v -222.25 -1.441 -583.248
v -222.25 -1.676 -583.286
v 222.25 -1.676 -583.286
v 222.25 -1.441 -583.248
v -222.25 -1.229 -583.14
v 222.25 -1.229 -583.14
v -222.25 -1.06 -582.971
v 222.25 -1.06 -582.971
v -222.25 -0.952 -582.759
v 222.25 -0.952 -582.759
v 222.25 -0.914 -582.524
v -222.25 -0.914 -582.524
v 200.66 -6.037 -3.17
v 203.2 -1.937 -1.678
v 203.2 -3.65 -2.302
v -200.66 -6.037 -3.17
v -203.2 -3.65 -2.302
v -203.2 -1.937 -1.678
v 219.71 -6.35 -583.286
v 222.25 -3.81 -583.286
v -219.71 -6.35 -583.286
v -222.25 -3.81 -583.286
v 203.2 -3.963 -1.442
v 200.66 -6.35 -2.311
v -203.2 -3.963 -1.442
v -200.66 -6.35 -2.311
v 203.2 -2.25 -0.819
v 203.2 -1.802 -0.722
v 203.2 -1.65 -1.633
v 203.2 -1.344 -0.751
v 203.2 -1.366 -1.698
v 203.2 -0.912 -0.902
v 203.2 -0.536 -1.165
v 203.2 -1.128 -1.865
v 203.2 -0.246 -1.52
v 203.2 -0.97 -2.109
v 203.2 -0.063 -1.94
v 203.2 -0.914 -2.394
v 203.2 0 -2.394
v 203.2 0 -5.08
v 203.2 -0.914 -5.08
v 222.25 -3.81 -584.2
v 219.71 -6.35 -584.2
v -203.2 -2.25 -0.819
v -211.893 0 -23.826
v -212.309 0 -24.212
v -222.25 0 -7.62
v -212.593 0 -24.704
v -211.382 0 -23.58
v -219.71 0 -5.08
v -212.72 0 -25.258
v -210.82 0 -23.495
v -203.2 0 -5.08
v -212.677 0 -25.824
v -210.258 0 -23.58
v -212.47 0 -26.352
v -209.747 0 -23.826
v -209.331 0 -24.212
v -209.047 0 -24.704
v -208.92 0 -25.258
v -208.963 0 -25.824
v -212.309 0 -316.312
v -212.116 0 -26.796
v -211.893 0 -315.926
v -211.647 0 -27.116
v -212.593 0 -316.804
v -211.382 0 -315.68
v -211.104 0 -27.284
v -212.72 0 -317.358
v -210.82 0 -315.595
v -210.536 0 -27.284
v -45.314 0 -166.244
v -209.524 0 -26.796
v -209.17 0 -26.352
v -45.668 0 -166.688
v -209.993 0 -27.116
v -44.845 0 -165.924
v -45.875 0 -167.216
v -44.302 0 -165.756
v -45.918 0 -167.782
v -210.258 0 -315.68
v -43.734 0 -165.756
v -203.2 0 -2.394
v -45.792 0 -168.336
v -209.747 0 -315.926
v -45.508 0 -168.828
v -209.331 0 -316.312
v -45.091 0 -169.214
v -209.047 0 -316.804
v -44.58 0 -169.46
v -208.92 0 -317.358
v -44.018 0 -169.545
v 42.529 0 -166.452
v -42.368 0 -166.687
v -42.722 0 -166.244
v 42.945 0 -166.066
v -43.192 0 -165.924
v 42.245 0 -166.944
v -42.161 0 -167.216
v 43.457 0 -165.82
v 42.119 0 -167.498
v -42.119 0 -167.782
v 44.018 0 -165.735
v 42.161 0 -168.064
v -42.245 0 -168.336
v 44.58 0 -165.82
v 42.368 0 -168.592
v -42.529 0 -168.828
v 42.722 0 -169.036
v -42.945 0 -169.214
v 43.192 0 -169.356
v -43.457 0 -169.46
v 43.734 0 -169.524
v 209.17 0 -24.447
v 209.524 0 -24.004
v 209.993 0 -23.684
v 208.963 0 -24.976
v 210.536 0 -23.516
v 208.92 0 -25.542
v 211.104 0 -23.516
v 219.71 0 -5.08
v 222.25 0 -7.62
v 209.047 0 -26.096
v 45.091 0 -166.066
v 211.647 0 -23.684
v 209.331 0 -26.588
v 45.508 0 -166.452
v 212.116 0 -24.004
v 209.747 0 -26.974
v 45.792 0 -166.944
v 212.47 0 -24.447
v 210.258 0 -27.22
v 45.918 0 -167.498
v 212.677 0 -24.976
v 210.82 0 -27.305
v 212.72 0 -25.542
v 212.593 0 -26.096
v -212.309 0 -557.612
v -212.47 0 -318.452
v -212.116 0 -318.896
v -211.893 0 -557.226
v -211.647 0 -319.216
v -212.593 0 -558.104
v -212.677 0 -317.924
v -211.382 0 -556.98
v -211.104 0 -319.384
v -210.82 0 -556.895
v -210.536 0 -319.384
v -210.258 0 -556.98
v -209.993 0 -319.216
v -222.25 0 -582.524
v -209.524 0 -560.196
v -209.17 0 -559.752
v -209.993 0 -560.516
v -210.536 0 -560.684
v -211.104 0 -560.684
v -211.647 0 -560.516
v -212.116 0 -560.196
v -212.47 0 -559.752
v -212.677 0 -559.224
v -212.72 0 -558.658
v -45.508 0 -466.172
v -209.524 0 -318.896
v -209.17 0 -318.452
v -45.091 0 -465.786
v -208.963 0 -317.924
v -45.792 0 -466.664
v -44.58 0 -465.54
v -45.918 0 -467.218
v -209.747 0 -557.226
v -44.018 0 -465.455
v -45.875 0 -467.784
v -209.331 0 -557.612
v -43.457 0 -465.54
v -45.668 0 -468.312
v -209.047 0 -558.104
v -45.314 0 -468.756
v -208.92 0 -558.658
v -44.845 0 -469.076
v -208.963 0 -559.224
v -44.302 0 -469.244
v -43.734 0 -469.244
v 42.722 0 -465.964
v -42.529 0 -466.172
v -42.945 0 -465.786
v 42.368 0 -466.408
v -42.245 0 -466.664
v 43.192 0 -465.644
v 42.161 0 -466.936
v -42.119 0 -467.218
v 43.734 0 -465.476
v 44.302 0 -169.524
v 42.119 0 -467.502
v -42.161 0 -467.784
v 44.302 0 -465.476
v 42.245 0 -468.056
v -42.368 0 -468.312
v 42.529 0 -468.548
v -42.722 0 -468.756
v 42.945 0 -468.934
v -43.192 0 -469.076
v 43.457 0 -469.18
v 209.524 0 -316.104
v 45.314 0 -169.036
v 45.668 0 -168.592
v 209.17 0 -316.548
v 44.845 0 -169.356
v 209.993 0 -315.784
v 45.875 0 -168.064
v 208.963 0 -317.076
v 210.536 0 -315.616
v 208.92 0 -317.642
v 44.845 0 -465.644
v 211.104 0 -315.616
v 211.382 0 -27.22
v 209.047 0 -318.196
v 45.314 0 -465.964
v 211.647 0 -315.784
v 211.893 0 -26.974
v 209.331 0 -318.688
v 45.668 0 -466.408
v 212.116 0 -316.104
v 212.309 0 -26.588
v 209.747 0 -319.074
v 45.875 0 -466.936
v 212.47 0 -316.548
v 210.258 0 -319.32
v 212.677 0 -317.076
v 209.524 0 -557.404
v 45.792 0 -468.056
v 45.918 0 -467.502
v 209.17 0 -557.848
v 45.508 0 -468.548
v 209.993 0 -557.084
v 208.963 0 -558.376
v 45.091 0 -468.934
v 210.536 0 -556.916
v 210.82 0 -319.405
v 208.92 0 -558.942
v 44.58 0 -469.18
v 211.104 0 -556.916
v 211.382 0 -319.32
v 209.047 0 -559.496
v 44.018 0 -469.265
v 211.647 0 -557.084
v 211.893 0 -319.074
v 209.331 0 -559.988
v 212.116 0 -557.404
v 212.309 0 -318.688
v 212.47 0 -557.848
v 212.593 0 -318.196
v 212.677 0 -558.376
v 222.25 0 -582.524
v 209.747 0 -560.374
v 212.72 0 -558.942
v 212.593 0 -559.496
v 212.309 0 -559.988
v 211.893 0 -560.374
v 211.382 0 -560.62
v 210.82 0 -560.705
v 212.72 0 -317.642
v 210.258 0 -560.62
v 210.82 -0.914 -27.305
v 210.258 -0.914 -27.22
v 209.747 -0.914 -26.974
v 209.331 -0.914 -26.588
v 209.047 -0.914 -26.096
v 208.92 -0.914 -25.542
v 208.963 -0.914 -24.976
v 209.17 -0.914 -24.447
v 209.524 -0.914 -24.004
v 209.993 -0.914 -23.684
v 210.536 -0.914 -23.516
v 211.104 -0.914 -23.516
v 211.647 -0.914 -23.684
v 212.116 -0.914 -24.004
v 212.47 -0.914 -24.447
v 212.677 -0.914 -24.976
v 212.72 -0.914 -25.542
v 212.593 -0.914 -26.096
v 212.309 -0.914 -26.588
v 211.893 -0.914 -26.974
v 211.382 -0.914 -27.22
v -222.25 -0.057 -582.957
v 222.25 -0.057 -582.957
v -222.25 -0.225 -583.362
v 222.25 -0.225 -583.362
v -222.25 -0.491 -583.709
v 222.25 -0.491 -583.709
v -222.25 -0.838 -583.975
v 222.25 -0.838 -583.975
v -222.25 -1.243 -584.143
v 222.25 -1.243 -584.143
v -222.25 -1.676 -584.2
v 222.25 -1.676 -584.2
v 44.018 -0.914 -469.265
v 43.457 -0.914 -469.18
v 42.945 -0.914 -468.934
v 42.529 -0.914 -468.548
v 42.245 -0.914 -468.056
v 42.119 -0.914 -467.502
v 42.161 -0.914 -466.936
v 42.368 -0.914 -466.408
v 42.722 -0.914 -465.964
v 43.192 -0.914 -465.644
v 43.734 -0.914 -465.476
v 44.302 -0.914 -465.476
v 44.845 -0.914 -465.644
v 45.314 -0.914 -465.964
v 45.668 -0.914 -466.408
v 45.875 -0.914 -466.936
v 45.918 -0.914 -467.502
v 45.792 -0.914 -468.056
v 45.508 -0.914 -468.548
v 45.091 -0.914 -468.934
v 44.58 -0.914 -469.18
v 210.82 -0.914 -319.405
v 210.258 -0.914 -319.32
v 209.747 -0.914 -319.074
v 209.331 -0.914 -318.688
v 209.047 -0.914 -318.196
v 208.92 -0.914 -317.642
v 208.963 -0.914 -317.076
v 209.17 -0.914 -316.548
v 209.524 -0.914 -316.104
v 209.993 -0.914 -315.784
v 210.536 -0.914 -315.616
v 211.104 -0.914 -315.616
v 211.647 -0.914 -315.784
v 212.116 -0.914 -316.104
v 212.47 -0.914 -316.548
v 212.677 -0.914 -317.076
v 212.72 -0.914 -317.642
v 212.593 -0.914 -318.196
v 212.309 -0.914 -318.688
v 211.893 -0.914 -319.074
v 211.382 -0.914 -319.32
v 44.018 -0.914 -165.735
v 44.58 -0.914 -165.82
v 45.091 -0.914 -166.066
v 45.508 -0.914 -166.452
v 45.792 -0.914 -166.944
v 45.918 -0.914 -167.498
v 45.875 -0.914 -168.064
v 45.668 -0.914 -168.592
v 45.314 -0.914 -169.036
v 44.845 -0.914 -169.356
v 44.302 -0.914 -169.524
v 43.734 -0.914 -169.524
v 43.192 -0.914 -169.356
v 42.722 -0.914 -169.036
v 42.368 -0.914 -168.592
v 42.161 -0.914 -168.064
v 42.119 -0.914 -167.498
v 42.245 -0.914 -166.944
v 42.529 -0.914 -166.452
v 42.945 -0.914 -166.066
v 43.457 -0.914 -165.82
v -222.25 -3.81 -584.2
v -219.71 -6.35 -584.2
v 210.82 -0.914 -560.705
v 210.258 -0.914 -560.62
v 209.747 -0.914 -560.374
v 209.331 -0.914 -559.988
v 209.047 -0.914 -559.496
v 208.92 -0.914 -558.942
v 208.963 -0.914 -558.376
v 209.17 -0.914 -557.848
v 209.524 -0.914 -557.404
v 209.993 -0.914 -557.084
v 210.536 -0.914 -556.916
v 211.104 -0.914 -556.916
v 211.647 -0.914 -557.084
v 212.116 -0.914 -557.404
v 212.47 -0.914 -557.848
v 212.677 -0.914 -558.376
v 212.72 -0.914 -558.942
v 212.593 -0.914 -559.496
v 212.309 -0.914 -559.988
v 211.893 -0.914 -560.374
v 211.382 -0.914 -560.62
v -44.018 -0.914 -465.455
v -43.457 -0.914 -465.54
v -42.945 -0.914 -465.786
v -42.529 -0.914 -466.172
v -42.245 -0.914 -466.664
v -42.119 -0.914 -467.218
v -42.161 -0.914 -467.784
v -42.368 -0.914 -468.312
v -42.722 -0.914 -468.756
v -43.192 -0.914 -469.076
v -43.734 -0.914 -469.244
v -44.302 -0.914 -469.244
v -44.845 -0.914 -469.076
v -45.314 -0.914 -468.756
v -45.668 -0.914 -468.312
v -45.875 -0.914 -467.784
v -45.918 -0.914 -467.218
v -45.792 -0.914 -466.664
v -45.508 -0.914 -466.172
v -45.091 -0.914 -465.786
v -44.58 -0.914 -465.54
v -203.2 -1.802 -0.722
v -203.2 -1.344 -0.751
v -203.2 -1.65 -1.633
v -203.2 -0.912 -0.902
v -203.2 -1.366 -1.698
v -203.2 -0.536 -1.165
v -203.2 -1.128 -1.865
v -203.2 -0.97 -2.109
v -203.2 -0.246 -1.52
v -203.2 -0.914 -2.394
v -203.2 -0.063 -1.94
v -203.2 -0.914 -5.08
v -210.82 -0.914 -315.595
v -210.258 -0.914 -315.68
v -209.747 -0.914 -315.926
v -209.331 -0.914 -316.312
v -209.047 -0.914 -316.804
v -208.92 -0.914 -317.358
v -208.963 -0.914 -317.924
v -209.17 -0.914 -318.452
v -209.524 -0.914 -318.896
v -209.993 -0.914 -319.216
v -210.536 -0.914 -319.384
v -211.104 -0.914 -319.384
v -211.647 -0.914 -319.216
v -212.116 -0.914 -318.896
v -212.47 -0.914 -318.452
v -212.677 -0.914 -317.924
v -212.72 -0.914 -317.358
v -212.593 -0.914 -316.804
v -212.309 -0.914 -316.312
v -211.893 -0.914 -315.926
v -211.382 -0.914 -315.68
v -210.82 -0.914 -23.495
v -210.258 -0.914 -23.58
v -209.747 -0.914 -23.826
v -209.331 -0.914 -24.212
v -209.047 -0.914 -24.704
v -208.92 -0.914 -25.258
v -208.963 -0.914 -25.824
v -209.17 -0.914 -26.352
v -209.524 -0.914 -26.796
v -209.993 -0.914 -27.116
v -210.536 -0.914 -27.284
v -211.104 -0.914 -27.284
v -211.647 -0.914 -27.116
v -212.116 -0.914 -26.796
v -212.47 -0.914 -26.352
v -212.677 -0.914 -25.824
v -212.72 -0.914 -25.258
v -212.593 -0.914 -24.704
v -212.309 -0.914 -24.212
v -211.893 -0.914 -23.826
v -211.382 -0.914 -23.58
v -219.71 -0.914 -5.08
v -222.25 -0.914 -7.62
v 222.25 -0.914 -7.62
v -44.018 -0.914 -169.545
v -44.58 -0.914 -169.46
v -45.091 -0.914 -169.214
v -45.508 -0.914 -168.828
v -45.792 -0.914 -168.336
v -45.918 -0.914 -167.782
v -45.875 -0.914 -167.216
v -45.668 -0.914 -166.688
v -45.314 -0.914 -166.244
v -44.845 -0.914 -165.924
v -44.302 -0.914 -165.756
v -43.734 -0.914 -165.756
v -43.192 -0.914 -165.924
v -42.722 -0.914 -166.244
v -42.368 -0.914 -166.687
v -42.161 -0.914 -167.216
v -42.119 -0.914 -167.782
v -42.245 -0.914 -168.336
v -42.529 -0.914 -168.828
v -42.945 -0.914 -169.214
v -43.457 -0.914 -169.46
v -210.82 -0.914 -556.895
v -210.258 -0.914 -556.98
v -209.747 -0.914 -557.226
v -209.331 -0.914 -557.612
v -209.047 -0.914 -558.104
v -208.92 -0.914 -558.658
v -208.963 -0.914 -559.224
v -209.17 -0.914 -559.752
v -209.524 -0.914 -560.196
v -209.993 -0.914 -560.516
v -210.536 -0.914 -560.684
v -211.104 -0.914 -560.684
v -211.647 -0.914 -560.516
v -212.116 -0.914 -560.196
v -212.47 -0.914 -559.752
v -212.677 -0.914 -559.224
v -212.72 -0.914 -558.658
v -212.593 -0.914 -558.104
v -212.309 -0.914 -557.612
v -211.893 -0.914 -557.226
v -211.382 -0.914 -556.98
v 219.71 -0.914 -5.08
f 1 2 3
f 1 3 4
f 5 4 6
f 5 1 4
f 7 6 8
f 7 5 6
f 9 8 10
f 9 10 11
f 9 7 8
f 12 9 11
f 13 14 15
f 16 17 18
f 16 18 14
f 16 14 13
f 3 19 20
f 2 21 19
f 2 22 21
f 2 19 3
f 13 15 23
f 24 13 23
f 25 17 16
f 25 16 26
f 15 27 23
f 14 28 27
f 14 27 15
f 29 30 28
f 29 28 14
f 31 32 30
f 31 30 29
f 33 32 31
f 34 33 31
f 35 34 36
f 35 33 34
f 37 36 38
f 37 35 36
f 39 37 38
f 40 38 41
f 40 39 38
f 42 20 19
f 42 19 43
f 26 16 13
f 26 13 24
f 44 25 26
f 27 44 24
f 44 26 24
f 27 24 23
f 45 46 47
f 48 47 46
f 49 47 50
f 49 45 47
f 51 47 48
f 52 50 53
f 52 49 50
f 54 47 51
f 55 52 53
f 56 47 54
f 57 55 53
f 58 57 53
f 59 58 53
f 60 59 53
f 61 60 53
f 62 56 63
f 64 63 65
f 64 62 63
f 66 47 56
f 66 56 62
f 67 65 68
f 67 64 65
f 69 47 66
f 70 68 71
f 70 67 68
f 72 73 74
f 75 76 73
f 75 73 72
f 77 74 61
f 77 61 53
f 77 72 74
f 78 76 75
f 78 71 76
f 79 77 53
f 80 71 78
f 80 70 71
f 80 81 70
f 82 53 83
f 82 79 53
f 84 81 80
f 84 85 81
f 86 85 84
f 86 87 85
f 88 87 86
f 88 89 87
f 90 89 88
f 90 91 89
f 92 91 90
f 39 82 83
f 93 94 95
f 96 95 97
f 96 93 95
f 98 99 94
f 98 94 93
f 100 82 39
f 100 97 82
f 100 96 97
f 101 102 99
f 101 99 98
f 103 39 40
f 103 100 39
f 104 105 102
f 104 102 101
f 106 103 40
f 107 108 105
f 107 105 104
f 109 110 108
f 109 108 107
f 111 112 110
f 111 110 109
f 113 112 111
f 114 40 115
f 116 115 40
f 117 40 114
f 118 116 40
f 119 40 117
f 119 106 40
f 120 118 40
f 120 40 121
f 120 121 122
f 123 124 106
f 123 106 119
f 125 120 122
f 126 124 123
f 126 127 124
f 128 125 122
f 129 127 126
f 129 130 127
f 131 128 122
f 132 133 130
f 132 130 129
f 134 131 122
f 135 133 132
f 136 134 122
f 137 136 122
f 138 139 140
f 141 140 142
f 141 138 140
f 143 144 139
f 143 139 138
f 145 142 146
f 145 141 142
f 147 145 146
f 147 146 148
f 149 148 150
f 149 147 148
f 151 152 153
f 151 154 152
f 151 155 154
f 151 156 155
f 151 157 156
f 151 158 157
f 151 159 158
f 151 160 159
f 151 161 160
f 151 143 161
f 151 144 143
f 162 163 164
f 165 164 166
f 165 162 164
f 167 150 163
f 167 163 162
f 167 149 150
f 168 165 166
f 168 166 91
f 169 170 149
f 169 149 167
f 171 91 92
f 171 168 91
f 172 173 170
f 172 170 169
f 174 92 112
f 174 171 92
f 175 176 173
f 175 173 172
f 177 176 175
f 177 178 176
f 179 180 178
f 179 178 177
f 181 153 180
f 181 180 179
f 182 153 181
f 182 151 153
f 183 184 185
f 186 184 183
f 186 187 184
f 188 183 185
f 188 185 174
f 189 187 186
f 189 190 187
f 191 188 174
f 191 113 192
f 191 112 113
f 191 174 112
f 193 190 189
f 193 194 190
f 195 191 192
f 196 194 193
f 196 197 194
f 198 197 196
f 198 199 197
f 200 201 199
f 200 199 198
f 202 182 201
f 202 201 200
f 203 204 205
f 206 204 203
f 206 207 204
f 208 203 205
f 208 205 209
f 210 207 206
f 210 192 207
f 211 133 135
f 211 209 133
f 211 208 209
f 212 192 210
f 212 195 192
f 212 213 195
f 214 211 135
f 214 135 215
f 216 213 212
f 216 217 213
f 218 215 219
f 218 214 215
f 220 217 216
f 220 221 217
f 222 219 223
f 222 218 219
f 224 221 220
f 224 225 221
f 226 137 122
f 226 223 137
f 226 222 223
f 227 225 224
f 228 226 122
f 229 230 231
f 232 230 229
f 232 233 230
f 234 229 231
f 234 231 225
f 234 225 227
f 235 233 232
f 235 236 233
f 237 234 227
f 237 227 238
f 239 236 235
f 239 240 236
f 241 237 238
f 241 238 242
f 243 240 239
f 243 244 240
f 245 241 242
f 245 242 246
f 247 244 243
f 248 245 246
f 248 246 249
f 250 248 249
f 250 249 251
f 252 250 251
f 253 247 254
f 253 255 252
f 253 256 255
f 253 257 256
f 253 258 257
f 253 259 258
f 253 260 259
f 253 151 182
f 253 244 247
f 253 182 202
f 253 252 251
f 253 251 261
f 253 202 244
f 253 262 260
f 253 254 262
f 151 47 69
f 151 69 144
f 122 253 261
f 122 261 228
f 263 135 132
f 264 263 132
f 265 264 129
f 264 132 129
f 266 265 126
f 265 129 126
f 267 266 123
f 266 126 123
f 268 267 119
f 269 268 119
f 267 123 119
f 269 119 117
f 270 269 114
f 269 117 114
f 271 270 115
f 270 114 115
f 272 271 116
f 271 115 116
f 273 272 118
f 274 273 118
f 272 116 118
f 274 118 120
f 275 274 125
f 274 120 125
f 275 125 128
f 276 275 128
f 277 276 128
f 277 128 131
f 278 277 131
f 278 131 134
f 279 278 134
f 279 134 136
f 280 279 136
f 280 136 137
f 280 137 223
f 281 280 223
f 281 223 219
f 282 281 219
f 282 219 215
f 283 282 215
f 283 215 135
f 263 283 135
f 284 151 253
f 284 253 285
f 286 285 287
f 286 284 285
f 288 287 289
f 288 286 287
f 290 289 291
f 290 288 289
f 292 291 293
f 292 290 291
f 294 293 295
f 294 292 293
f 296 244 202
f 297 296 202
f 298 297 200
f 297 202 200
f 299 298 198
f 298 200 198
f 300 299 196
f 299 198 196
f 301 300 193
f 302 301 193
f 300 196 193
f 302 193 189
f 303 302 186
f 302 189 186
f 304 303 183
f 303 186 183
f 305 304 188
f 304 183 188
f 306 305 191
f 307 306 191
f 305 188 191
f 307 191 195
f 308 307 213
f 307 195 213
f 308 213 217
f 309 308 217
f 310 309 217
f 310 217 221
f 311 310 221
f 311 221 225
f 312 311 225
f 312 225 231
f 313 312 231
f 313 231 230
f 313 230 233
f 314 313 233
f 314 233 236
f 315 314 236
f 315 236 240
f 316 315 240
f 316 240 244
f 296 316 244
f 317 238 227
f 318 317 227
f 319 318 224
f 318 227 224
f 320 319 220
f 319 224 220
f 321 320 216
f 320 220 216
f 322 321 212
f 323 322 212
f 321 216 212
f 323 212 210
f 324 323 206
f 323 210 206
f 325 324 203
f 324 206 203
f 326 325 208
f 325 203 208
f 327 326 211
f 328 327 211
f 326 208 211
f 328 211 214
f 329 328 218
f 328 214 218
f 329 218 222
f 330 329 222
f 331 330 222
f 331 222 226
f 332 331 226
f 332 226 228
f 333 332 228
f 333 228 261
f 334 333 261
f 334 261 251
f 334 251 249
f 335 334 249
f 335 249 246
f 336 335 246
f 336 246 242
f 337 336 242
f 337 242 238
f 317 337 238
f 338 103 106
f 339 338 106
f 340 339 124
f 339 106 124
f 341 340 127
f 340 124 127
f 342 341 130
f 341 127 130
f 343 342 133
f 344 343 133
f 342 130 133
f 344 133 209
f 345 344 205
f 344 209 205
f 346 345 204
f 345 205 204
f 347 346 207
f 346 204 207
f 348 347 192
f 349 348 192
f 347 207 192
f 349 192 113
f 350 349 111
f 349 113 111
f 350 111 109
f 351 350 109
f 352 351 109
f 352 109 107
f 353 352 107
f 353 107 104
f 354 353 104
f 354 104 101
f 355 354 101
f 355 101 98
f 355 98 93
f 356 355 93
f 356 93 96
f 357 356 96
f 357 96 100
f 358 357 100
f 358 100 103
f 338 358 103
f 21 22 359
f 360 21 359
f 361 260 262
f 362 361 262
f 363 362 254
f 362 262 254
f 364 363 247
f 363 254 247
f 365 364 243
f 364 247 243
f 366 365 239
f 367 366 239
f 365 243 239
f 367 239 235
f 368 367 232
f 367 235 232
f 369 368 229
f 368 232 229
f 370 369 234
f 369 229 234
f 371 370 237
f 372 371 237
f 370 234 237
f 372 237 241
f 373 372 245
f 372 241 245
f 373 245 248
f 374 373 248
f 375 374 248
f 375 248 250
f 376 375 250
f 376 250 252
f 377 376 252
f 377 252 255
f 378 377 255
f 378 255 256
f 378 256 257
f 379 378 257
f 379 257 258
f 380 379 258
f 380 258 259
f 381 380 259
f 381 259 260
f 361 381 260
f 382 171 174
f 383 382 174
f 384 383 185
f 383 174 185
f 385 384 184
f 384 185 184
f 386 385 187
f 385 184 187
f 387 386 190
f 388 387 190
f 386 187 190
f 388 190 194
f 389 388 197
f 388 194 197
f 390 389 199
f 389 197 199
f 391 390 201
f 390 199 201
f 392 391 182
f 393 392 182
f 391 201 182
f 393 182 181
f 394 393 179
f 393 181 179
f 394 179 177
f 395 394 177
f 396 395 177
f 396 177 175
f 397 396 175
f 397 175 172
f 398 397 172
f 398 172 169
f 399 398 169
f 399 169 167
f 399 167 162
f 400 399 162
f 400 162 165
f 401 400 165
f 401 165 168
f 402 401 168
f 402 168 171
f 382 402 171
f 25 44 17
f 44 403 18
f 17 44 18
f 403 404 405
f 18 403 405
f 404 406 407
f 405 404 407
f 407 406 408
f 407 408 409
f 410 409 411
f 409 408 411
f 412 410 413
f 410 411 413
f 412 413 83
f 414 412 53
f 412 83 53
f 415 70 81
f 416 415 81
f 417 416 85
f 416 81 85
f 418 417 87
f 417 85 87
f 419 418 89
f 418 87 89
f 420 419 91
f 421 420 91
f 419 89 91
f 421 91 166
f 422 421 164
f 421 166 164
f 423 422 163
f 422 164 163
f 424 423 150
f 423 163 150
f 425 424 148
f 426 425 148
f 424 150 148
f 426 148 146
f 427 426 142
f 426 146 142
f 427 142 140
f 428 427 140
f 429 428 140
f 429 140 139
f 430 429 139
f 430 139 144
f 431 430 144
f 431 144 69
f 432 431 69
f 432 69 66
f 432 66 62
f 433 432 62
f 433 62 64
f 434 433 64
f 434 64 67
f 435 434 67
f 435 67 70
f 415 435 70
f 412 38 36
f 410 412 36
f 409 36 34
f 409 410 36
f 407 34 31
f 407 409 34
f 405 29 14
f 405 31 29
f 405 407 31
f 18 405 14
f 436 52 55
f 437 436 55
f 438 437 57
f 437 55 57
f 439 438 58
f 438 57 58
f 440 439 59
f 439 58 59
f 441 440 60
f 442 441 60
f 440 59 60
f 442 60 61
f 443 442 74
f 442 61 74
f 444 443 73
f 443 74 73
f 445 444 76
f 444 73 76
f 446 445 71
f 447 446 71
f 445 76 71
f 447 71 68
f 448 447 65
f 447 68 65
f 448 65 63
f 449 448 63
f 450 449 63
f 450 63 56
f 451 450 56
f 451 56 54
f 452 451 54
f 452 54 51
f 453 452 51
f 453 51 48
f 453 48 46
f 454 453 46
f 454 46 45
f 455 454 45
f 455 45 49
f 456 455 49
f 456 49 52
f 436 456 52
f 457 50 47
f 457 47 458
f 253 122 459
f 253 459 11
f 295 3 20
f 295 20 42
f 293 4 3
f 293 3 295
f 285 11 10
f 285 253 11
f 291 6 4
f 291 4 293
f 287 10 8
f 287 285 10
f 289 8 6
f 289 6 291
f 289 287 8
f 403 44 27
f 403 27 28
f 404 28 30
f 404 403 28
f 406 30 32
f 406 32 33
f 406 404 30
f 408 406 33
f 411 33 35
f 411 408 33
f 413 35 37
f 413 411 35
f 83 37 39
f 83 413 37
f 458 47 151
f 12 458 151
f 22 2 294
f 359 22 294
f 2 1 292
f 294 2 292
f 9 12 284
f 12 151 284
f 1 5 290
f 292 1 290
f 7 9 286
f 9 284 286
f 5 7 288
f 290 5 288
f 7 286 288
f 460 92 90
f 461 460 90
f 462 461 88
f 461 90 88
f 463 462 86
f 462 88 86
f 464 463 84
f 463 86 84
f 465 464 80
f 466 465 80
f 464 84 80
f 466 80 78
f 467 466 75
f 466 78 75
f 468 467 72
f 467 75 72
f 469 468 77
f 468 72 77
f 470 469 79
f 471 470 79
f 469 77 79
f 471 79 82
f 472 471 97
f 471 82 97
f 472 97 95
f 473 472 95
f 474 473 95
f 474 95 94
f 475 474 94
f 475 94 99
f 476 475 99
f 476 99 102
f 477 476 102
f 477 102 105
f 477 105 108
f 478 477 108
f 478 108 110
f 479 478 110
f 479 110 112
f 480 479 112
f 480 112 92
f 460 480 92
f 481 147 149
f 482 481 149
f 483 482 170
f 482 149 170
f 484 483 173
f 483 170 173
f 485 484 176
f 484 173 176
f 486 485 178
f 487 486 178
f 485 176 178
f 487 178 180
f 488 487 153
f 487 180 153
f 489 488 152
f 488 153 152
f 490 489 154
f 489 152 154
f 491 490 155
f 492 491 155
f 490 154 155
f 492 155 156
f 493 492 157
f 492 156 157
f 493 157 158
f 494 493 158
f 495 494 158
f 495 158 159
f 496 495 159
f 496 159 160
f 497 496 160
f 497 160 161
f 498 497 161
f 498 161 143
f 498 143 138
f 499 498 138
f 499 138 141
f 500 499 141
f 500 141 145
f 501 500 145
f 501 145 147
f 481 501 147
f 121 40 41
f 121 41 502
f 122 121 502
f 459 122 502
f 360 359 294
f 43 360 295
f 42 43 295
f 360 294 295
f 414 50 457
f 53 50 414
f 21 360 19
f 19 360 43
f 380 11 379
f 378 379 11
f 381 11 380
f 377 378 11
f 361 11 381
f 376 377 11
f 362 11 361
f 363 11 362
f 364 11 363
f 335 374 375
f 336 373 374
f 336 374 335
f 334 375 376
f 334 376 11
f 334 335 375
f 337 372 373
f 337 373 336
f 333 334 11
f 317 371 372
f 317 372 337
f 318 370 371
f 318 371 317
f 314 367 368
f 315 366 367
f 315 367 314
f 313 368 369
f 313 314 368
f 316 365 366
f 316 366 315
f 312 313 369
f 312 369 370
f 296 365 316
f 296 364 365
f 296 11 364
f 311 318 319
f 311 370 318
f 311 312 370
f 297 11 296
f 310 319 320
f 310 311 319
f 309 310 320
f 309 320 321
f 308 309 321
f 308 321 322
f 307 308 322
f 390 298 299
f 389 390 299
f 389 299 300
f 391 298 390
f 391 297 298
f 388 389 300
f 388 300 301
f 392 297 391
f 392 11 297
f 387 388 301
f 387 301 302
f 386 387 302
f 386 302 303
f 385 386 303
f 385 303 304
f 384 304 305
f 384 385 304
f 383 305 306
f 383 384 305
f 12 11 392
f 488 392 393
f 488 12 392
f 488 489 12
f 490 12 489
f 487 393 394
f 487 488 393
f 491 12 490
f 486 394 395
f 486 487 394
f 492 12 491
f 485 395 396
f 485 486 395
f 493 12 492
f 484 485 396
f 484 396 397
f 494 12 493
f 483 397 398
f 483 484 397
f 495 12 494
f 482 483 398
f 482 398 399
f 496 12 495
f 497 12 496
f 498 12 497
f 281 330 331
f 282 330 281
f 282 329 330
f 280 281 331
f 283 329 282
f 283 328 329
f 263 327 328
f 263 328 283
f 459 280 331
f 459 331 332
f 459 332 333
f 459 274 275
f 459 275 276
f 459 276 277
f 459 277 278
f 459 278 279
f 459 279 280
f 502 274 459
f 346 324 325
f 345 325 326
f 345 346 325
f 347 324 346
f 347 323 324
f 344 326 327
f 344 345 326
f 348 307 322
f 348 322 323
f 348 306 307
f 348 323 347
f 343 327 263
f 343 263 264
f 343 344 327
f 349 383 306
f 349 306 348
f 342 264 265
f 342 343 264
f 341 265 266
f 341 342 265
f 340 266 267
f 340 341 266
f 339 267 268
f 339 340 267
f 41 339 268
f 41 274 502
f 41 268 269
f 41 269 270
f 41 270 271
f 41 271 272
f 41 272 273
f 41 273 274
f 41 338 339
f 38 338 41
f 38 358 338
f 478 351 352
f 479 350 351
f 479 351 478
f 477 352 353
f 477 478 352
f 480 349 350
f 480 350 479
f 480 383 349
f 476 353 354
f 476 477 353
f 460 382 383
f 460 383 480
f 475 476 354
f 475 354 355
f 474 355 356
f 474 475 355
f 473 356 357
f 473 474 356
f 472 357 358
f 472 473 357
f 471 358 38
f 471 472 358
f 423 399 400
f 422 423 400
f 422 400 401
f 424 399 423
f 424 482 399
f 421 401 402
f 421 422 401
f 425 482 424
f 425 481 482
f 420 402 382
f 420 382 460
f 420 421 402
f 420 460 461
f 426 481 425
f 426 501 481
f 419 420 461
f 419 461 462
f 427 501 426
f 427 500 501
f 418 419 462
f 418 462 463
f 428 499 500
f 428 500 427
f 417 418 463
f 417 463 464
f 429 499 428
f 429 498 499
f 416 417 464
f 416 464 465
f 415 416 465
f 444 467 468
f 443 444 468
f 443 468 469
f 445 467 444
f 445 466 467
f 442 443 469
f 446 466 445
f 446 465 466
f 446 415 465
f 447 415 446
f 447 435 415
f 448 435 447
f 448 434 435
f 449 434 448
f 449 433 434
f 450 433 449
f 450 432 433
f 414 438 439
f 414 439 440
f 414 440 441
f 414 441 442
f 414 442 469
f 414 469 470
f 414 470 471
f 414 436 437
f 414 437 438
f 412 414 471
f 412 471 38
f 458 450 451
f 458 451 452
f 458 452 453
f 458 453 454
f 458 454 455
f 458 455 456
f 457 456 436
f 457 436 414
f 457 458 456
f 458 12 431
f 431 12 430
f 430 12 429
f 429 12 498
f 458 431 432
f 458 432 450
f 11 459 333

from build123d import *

# Parameters (mm, degrees)
SKETCH2_W            = 444.5
SKETCH2_H            = 584.2
BOSS_EXTRUDE1_DEPTH  = 6.35
MOVE_START           = -2.17182791
MOVE_FACE1_OUTLINE_W = 448
MOVE_FACE1_OUTLINE_H = 9
MOVE_FACE1_DEPTH     = 2.17182791
CONVERT_SOLID1_START = -222.25
CONVERT_SOLID1_DEPTH = 444.5
SKETCH7_W            = 19.05
SKETCH7_H            = 5.08
CUT_EXTRUDE1_DEPTH   = 626.080014878
SKETCH9_R            = 1.905
CUT_EXTRUDE2_DEPTH   = 1.2192
CHAMFER1_SIZE        = 2.54


# Read off the part's stored shape, not the designer's step: Move Face1, Convert-Solid1
with BuildPart() as part:
    # Sketch2 → Boss-Extrude1 (new body)
    with BuildSketch(Plane(origin=(0, 0, 0), x_dir=(1, 0, 0), z_dir=(0, 1, 0))):
        with Locations((0, 292.1)):
            Rectangle(SKETCH2_W, SKETCH2_H)
    extrude(amount=-BOSS_EXTRUDE1_DEPTH)

    # Move Face1 outline → Move Face1 (cut)
    with BuildSketch(Plane(origin=(0, 0, 0), x_dir=(1, 0, 0), z_dir=(0, 0.3420201433256691, -0.9396926207859083)).offset(MOVE_START)):
        with Locations((0, 3.5)):
            Rectangle(MOVE_FACE1_OUTLINE_W, MOVE_FACE1_OUTLINE_H)
    extrude(amount=MOVE_FACE1_DEPTH, mode=Mode.SUBTRACT)

    # Convert-Solid1 outline → Convert-Solid1 (cut)
    with BuildSketch(Plane.YZ.offset(CONVERT_SOLID1_START)):
        with BuildLine():
            Line((-6.037256781, -3.17046592), (-6.35, -2.311210988))
            Line((-6.35, -2.311210988), (-6.35, -583.2856))
            Line((-6.35, -583.2856), (-1.6764, -583.2856))
            ThreePointArc((-1.6764, -583.2856), (-1.137584633, -583.062415367), (-0.9144, -582.5236))
            Line((-0.9144, -582.5236), (-0.9144, -2.394147319))
            ThreePointArc((-0.9144, -2.394147319), (-1.239334756, -1.769953461), (-1.937019349, -1.678101541))
            Line((-1.937019349, -1.678101541), (-6.037256781, -3.17046592))
        make_face()
        with BuildLine():
            Line((0, 0), (-2.249762568, -0.818846609))
            ThreePointArc((-2.249762568, -0.818846609), (-0.714856462, -1.020920831), (0, -2.394147319))
            Line((0, -2.394147319), (0, 0))
        make_face()
        with BuildLine():
            Line((0, -584.2), (0, -582.5236))
            ThreePointArc((0, -582.5236), (-0.491006192, -583.708993808), (-1.6764, -584.2))
            Line((-1.6764, -584.2), (0, -584.2))
        make_face()
    extrude(amount=CONVERT_SOLID1_DEPTH, mode=Mode.SUBTRACT)

    # Sketch7 → Cut-Extrude1 (cut, through all)
    with BuildSketch(Plane(origin=(0, 0, 0), x_dir=(1, 0, 0), z_dir=(0, 1, 0))):
        with Locations((-212.725, 2.54)):
            Rectangle(SKETCH7_W, SKETCH7_H)
        with Locations((212.725, 2.54)):
            Rectangle(SKETCH7_W, SKETCH7_H)
    extrude(amount=-CUT_EXTRUDE1_DEPTH, mode=Mode.SUBTRACT)

    # Sketch9 → Cut-Extrude2 (cut)
    with BuildSketch(Plane(origin=(0, 0, 0), x_dir=(1, 0, 0), z_dir=(0, 1, 0))):
        with Locations(Location((-210.82, 25.4, 0), (0, 0, 270))):
            Circle(SKETCH9_R)
        with Locations(Location((-210.82, 317.5, 0), (0, 0, 270))):
            Circle(SKETCH9_R)
        with Locations(Location((-210.82, 558.8, 0), (0, 0, 270))):
            Circle(SKETCH9_R)
        with Locations(Location((210.82, 558.8, 0), (0, 0, 90))):
            Circle(SKETCH9_R)
        with Locations(Location((210.82, 317.5, 0), (0, 0, 90))):
            Circle(SKETCH9_R)
        with Locations(Location((210.82, 25.4, 0), (0, 0, 90))):
            Circle(SKETCH9_R)
        with Locations(Location((-44.0182, 167.64, 0), (0, 0, 90))):
            Circle(SKETCH9_R)
        with Locations(Location((-44.0182, 467.36, 0), (0, 0, 270))):
            Circle(SKETCH9_R)
        with Locations(Location((44.0182, 467.36, 0), (0, 0, 90))):
            Circle(SKETCH9_R)
        with Locations(Location((44.0182, 167.64, 0), (0, 0, 270))):
            Circle(SKETCH9_R)
    extrude(amount=-CUT_EXTRUDE2_DEPTH, mode=Mode.SUBTRACT)

    # Chamfer1
    chamfer1_edges = [part.edges().sort_by_distance(p)[0] for p in [
        (-222.25, -6.35, -583.7428),
        (222.25, -6.35, -583.7428),
        (-222.25, -0.4572, -5.08),
        (-203.2, -6.193628391, -2.740838454),
        (222.25, -0.4572, -5.08),
        (203.2, -6.193628391, -2.740838454),
    ]]
    chamfer(chamfer1_edges, length=CHAMFER1_SIZE)


solid = part.part
